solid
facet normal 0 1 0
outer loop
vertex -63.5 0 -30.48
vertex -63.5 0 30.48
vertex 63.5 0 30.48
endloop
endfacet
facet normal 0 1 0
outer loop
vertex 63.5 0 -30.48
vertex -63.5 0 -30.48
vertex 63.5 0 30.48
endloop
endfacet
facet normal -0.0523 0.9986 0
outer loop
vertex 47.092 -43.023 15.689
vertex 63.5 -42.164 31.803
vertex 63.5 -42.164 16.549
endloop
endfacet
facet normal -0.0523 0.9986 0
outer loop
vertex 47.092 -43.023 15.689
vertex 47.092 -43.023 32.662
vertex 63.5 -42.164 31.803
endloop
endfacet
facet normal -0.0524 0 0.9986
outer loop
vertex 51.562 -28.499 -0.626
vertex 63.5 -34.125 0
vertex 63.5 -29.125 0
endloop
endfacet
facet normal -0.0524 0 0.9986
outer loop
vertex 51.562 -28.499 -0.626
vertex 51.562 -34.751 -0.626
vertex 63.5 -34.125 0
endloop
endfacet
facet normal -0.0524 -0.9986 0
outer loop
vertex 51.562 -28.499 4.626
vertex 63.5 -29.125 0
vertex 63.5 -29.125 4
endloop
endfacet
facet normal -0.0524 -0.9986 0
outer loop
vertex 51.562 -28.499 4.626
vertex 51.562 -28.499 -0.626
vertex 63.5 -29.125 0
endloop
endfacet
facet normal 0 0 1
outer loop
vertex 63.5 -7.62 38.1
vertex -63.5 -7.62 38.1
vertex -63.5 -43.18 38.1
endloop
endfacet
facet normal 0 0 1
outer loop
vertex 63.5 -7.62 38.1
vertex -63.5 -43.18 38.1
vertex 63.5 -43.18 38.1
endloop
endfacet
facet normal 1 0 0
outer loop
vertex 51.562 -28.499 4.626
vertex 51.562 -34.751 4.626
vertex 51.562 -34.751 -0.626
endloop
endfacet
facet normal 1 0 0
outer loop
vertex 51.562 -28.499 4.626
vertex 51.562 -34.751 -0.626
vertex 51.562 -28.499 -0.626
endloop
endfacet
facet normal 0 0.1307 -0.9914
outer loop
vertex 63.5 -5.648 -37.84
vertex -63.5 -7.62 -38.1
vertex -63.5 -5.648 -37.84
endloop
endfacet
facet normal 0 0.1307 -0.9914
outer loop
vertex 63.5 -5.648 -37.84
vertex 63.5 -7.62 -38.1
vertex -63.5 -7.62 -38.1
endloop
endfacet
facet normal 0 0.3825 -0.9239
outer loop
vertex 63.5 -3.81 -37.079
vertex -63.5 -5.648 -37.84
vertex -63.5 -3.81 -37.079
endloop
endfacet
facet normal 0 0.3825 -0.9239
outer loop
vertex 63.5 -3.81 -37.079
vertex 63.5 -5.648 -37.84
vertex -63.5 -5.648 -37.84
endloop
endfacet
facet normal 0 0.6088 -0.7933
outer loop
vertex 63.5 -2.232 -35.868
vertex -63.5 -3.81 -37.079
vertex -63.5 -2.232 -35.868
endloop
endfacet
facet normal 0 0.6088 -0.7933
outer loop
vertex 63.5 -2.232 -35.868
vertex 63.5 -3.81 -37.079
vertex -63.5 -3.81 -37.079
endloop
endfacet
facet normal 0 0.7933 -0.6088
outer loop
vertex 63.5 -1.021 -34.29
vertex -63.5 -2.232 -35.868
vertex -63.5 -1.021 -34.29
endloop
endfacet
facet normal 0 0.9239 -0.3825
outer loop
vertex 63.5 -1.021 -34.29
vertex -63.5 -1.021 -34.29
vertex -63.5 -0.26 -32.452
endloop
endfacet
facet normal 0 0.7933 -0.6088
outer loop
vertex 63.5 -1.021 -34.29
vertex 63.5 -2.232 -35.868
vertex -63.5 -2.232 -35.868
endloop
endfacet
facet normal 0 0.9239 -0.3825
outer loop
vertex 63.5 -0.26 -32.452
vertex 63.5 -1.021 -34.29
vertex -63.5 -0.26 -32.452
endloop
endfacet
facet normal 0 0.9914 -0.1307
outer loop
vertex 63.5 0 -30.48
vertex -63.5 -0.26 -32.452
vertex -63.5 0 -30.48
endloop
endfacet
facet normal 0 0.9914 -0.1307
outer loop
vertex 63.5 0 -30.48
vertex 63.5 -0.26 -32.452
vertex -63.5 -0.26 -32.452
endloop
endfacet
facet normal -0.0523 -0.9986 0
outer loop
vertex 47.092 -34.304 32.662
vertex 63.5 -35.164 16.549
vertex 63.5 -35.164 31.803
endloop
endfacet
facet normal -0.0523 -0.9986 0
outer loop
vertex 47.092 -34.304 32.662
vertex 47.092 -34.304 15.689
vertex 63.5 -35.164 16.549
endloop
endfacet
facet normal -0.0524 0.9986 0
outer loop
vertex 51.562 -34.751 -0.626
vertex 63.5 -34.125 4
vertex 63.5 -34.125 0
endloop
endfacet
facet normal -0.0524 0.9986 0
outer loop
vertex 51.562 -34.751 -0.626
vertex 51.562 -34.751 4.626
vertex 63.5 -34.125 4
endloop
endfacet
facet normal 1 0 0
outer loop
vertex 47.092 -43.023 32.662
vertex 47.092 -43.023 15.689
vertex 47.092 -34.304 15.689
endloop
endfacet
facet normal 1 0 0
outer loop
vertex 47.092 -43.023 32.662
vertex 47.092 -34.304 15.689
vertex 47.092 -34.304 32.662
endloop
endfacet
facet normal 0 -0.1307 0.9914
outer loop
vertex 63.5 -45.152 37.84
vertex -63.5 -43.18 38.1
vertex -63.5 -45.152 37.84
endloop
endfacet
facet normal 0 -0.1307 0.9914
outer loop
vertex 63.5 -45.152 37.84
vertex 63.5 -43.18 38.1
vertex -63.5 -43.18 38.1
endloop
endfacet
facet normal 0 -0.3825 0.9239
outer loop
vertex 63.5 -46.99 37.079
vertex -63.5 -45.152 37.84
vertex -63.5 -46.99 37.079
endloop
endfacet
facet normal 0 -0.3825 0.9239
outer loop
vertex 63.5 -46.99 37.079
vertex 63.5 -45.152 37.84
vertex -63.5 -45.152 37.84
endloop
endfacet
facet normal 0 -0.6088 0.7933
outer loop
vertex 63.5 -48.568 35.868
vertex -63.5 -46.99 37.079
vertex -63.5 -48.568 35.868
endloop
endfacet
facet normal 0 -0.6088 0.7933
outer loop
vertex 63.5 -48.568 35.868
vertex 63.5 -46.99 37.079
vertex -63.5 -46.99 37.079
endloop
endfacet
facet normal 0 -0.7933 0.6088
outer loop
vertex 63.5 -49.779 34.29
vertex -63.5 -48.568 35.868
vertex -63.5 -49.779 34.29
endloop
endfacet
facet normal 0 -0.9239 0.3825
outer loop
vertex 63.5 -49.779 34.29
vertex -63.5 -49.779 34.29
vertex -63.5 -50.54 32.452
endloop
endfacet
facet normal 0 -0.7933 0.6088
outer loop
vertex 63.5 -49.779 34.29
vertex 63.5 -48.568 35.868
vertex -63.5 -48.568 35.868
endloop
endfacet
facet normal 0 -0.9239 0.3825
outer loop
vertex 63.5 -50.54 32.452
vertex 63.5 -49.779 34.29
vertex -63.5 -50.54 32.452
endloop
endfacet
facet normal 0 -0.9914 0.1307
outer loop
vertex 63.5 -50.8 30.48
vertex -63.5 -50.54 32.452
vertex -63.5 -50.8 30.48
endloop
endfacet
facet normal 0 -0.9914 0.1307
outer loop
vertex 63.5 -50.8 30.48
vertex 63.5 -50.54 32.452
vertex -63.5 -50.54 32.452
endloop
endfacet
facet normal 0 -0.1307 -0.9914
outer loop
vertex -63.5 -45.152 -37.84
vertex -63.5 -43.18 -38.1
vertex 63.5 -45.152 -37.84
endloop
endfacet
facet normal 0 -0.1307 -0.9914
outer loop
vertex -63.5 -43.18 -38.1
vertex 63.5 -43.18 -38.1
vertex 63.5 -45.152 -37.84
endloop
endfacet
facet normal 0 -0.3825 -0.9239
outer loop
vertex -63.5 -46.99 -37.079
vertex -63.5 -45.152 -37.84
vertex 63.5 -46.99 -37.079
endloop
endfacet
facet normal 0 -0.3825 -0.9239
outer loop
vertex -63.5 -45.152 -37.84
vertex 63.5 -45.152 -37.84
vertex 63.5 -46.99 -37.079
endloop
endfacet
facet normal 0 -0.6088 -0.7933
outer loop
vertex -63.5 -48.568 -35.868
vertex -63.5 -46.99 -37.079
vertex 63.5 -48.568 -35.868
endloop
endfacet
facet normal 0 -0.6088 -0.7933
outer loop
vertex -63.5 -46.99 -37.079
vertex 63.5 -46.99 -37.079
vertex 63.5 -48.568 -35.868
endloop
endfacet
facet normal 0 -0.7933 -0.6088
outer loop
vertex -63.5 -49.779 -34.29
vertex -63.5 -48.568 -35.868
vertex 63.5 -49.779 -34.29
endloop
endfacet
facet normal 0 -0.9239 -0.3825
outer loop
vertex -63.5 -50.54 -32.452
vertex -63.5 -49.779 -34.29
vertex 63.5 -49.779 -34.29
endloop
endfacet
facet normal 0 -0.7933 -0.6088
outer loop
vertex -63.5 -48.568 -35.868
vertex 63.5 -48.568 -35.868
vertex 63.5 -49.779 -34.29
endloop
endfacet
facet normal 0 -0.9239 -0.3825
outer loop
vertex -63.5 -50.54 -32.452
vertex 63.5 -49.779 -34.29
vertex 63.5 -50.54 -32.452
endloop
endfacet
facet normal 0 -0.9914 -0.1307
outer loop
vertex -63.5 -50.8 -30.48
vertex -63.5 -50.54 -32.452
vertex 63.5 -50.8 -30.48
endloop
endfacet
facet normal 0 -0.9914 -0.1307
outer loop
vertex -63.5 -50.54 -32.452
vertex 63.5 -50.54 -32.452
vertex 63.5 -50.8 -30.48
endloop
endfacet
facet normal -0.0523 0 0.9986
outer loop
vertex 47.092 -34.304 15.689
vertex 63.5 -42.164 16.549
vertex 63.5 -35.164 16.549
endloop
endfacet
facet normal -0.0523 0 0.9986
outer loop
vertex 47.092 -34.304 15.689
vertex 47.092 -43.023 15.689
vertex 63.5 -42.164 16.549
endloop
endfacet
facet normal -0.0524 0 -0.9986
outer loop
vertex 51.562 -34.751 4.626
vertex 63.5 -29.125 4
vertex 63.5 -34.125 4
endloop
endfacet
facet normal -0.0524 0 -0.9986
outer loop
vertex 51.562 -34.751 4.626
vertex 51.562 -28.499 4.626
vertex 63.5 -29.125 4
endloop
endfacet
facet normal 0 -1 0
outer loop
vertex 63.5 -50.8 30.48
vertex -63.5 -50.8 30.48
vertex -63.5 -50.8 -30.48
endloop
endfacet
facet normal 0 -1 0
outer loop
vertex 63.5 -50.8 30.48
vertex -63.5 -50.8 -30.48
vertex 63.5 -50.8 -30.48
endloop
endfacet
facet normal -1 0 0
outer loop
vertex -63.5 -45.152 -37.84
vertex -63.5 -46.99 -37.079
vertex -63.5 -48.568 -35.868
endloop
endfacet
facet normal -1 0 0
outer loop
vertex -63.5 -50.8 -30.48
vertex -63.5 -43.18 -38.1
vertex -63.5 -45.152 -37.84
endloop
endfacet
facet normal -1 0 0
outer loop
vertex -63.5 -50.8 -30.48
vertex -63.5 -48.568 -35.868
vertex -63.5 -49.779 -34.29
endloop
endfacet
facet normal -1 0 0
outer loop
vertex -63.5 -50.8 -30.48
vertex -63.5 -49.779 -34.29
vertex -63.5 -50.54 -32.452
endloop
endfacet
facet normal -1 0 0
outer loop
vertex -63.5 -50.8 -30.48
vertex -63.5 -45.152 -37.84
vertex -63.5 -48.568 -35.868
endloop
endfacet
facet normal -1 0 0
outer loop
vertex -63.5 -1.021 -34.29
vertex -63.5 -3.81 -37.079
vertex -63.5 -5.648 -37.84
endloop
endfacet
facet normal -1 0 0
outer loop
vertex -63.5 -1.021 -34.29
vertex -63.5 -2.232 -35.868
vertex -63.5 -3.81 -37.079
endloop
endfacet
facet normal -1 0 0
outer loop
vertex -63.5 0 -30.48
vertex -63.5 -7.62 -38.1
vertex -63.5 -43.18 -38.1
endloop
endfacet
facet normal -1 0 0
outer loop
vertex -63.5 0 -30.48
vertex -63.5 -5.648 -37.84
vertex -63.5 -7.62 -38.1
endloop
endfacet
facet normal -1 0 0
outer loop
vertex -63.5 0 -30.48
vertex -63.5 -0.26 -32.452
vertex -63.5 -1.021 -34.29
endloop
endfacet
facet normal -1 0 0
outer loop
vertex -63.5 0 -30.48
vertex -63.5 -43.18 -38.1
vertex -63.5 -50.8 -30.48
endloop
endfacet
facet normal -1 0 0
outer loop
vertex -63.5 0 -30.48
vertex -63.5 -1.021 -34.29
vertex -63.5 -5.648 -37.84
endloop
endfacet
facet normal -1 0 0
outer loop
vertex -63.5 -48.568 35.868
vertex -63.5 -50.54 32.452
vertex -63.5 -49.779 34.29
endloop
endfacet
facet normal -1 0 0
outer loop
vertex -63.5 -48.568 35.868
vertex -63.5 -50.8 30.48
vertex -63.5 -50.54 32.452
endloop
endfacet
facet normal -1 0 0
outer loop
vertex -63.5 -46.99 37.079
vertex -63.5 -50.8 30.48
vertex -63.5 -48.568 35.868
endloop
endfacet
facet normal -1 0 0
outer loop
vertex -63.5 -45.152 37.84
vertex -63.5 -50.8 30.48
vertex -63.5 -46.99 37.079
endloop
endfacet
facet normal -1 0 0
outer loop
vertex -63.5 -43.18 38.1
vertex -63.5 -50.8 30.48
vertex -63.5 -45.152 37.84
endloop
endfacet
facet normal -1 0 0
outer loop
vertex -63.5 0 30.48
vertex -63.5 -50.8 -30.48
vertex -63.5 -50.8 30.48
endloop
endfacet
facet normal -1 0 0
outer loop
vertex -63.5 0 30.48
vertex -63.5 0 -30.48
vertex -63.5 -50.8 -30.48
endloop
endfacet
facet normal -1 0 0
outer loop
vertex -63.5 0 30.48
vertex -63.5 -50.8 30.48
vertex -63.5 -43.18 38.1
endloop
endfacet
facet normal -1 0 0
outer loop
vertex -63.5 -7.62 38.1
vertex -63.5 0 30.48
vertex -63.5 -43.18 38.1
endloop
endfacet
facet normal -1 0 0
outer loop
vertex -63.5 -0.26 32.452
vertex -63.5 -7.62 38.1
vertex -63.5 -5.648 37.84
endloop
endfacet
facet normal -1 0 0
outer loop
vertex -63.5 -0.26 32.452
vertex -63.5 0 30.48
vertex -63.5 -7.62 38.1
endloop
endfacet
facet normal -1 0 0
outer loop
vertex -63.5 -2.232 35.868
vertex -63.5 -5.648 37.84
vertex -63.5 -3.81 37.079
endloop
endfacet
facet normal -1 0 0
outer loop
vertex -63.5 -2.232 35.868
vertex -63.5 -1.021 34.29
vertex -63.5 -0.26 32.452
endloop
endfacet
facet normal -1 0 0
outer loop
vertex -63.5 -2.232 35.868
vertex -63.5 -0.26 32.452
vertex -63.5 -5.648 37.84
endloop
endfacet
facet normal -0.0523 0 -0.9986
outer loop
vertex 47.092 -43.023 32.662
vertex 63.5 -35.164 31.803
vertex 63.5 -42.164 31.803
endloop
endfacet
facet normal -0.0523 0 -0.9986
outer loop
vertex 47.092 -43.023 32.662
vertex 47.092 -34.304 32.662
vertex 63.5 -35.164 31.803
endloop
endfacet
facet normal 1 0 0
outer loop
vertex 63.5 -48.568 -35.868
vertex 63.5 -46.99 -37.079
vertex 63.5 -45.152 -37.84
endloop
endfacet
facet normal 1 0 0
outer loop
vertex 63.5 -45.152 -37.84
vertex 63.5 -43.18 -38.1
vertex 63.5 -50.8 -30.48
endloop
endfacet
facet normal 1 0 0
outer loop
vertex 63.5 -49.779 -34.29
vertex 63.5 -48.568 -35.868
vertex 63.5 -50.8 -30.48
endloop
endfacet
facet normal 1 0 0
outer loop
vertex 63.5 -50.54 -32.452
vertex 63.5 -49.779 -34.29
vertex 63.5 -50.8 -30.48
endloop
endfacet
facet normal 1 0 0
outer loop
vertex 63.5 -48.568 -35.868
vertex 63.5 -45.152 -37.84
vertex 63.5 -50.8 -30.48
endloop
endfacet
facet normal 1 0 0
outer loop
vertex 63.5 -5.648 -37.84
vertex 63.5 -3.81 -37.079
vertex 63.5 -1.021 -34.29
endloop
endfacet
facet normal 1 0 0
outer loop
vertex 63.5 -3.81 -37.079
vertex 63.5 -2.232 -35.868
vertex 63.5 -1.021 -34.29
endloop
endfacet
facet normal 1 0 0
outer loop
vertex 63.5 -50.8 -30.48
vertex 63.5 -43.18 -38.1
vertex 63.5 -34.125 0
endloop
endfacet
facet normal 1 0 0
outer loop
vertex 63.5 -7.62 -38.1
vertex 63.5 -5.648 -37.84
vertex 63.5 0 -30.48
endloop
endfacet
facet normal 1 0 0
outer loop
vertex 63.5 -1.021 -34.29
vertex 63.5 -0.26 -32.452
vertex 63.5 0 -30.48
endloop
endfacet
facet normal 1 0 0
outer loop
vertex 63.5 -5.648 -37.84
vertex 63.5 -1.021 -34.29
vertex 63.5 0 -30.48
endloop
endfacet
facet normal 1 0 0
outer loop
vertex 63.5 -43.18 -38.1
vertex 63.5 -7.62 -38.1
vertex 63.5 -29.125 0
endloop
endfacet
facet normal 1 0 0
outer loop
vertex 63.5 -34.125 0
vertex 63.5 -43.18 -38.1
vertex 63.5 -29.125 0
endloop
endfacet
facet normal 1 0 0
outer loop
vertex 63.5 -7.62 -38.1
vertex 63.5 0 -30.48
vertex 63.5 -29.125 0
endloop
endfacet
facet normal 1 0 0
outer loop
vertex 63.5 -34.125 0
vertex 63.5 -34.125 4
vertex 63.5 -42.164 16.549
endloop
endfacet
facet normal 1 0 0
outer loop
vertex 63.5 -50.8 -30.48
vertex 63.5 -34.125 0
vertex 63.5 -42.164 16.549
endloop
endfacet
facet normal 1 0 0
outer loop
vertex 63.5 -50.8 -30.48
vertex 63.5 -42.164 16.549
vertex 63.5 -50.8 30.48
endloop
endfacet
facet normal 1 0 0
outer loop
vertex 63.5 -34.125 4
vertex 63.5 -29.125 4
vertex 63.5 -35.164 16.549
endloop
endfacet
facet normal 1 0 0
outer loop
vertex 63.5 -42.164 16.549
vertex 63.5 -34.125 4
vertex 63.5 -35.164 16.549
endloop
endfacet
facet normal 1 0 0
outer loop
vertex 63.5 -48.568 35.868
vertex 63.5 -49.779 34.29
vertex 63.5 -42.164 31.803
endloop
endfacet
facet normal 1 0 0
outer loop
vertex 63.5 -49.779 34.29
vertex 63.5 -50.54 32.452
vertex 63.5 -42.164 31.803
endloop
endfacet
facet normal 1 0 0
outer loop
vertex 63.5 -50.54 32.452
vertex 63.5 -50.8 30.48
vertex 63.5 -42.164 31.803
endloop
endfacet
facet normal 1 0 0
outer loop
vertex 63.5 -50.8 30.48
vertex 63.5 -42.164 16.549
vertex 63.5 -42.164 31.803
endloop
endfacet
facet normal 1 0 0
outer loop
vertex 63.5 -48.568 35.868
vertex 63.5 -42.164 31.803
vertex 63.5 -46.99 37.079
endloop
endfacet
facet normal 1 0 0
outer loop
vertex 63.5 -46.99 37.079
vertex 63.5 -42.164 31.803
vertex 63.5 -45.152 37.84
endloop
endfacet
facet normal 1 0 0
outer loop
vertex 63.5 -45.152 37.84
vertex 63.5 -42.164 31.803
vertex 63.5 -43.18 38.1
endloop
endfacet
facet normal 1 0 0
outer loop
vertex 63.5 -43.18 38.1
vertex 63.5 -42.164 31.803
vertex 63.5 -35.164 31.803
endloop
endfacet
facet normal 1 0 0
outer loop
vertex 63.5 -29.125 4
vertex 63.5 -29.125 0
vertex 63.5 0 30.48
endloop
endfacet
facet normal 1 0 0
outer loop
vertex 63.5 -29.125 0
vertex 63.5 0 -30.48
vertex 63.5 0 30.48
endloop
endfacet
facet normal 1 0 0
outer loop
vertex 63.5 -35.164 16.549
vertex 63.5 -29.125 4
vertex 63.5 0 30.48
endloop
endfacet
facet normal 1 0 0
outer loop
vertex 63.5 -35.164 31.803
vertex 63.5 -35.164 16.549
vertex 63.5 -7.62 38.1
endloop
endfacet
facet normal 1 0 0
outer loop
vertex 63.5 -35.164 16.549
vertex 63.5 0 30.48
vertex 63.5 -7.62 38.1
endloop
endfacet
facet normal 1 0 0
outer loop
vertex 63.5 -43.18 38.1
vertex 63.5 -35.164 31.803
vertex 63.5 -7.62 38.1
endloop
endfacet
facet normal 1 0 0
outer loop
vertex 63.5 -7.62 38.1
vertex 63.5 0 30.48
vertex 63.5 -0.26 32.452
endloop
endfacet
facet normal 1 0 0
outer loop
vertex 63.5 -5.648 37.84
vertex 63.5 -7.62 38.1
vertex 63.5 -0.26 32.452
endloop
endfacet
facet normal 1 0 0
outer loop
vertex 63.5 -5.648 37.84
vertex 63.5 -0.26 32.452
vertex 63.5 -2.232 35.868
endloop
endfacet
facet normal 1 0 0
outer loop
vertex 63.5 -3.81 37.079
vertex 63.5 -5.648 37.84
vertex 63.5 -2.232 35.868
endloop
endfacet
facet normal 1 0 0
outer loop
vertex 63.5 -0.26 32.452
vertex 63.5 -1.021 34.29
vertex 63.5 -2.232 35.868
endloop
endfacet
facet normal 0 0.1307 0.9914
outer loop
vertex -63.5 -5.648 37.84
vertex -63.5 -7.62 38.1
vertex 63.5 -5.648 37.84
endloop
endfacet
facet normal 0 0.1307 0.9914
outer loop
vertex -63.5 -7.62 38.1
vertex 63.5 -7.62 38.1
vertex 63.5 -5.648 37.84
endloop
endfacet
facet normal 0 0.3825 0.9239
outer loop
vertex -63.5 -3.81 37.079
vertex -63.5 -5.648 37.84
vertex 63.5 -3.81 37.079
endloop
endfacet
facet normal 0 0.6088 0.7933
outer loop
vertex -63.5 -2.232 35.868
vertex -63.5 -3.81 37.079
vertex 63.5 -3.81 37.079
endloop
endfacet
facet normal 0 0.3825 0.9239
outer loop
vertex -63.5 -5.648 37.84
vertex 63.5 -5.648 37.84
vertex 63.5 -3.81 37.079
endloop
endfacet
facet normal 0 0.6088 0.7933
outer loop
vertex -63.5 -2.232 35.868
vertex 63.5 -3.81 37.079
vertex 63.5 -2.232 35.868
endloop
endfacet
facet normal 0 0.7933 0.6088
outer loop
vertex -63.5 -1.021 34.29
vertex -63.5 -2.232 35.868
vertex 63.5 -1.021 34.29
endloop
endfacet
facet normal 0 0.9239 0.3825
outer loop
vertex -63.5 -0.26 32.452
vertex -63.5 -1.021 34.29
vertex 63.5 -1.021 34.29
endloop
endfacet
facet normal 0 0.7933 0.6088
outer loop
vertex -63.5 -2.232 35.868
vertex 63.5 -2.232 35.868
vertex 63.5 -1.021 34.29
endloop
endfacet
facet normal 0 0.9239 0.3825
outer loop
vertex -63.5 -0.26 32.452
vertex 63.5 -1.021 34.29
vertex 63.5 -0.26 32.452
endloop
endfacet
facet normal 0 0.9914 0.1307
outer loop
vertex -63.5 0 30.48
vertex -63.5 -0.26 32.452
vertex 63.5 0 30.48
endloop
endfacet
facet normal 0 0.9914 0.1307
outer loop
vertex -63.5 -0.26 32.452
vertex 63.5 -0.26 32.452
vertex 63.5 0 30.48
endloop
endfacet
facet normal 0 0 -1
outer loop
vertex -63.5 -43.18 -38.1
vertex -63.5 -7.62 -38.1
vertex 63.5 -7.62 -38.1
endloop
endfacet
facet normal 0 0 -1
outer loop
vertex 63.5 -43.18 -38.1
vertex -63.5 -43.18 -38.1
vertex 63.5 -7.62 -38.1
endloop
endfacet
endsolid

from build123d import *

# Parameters (mm, degrees)
F0_W     = 127
F0_H     = 76.2
F1_DEPTH = 50.8
F2_R     = 7.62
F3_W     = 7
F3_H     = 15.2537040412
F4_DEPTH = 16.4084
F4_TAPER = -3
F5_W     = 5
F5_H     = 4.0000001475
F6_DEPTH = 11.938
F6_TAPER = -3


with BuildPart() as f1:
    # F0 (on Front) → F1 (new body)
    with BuildSketch(Plane.XZ):
        Rectangle(F0_W, F0_H)
    extrude(amount=F1_DEPTH)

    # F2
    f2_edges = [f1.edges().sort_by_distance(p)[0] for p in [
        (0, -50.8, 38.1),
        (0, 0, 38.1),
        (0, -50.8, -38.1),
        (0, 0, -38.1),
    ]]
    fillet(f2_edges, radius=F2_R)

    # F3 (on face) → F4 (cut)
    with BuildSketch(Plane.YZ.offset(63.5)):
        with Locations((-38.6635434031, 24.1756830364)):
            Rectangle(F3_W, F3_H)
    extrude(amount=-F4_DEPTH, taper=F4_TAPER, mode=Mode.SUBTRACT)

    # F5 (on face) → F6 (cut)
    with BuildSketch(Plane.YZ.offset(63.5)):
        with Locations((-31.6249994836, 2.0000000738)):
            Rectangle(F5_W, F5_H)
    extrude(amount=-F6_DEPTH, taper=F6_TAPER, mode=Mode.SUBTRACT)


solid = f1.part
